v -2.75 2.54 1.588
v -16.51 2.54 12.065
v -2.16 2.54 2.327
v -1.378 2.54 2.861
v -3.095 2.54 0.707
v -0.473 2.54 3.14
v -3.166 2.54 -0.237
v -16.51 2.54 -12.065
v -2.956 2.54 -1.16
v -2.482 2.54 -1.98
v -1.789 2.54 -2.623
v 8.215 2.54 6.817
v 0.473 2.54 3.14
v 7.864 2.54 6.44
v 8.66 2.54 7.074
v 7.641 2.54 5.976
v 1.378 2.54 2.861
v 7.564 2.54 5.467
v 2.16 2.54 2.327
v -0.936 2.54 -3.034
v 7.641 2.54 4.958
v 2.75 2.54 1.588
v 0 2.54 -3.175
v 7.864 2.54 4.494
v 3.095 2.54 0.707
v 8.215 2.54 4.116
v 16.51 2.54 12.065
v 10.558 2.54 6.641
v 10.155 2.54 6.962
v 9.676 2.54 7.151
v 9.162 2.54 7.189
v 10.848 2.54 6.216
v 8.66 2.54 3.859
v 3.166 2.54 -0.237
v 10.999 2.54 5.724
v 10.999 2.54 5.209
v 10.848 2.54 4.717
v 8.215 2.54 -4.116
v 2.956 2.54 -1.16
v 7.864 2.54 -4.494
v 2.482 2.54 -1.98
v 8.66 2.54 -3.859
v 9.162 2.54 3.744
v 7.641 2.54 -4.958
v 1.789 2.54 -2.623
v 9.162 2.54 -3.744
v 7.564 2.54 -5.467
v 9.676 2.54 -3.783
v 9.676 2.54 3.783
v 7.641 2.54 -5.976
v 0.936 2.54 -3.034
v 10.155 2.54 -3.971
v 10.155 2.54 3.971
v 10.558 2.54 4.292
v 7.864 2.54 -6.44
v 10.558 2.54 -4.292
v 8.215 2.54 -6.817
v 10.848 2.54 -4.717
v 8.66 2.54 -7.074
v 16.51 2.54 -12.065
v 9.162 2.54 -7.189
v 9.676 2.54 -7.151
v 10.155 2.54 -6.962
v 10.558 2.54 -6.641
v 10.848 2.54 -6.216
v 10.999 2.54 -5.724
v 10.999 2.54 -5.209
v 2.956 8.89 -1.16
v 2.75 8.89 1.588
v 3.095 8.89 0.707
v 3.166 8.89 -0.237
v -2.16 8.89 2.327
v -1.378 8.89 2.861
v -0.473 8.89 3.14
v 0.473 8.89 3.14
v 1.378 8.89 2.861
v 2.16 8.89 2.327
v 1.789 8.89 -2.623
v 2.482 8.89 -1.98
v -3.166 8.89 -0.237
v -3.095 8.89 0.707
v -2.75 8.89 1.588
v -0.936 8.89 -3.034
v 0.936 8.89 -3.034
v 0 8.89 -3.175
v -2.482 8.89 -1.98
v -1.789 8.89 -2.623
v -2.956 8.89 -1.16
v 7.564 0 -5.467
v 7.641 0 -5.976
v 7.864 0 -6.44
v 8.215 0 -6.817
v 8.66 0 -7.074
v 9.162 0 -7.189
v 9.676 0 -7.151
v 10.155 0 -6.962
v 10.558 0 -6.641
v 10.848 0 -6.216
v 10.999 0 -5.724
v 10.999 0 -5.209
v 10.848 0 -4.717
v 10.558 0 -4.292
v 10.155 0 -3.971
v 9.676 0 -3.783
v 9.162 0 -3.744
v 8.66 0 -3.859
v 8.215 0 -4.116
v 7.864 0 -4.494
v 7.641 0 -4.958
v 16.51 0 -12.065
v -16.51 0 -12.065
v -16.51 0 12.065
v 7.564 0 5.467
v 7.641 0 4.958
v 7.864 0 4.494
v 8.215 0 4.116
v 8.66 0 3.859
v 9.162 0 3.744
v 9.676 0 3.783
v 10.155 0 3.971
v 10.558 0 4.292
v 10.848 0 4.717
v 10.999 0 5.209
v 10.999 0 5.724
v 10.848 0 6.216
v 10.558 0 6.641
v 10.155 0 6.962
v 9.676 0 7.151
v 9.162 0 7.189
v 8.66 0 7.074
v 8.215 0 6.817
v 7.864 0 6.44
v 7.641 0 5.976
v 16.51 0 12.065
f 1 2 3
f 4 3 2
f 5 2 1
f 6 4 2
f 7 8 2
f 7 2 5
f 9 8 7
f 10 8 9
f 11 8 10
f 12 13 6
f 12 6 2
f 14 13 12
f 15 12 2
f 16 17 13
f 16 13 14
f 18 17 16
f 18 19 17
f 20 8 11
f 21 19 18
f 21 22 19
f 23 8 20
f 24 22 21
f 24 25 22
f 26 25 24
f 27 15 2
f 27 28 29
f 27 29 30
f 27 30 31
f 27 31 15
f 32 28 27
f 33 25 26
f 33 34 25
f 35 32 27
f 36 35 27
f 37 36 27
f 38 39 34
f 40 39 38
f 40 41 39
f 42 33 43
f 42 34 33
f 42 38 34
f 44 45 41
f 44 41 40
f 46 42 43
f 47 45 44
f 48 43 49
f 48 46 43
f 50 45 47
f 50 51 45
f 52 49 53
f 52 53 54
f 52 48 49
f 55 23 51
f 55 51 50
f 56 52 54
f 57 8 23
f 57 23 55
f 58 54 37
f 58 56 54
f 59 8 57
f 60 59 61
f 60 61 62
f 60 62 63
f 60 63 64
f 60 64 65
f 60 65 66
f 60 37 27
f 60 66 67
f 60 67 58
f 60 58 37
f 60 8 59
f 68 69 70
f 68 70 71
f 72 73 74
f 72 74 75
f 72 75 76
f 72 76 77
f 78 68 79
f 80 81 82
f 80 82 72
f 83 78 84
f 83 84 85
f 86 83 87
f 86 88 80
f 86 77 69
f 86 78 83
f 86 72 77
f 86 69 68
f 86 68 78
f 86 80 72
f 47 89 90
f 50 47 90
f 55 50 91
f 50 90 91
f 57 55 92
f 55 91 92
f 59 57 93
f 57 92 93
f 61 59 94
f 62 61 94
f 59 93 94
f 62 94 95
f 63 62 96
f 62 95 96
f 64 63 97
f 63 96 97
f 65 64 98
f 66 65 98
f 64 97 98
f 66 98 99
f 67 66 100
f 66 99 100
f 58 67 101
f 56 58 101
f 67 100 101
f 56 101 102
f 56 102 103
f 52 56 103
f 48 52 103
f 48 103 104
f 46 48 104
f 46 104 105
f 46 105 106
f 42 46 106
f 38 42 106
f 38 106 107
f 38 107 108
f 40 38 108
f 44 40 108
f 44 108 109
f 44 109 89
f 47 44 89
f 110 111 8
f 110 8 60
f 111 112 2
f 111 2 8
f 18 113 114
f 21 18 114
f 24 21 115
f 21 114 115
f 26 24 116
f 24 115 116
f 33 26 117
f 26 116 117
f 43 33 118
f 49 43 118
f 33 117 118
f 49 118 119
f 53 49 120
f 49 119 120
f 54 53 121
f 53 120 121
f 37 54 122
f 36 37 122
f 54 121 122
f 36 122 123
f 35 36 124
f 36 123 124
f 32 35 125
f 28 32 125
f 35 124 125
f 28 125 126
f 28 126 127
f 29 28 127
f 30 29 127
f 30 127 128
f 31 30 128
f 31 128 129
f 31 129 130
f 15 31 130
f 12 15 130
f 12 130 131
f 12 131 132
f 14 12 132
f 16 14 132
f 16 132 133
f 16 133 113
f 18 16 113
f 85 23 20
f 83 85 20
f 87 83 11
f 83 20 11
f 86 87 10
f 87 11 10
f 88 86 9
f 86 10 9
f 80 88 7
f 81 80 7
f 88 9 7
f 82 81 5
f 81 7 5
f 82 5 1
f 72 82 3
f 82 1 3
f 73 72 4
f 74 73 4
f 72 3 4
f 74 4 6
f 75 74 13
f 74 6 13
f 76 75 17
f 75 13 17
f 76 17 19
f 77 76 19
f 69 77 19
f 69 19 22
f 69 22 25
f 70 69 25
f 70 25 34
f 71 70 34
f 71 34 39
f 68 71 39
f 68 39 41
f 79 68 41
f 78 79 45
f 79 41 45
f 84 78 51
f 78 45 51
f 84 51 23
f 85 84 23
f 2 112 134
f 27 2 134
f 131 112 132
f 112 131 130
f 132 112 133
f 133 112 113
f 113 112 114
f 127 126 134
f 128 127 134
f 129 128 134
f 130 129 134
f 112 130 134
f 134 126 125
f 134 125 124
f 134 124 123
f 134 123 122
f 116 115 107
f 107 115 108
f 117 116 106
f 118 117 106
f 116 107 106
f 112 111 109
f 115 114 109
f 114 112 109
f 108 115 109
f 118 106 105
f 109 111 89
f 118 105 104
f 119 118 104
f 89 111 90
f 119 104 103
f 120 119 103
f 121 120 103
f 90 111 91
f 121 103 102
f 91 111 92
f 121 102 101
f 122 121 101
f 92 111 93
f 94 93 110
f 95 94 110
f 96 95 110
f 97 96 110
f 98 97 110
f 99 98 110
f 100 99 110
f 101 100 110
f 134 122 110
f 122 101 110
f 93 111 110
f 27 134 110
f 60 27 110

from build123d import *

# Parameters (mm, degrees)
SKETCH1_W             = 33.02
SKETCH1_H             = 24.13
BOSS_EXTRUDE1_DEPTH   = 2.54
SKETCH2_R             = 3.175
BOSS_EXTRUDE2_DEPTH   = 6.35
F_4_CLEARANCE_HOLE1_D = 3.4544


with BuildPart() as part:
    # Sketch1 → Boss-Extrude1 (new body)
    with BuildSketch(Plane(origin=(0, 0, 0), x_dir=(1, 0, 0), z_dir=(0, 1, 0))):
        Rectangle(SKETCH1_W, SKETCH1_H)
    extrude(amount=BOSS_EXTRUDE1_DEPTH)

    # Sketch2 → Boss-Extrude2 (add)
    with BuildSketch(Plane(origin=(0, 2.54, 0), x_dir=(1, 0, 0), z_dir=(0, 1, 0))):
        with Locations(Location((0, 0, 0), (0, 0, 90))):
            Circle(SKETCH2_R)
    extrude(amount=BOSS_EXTRUDE2_DEPTH)

    # #4 Clearance Hole1 (through all)
    with Locations(Plane(origin=(0, 2.54, 0), x_dir=(1, 0, 0), z_dir=(0, 1, 0))):
        with Locations((9.291486619, 5.466660474), (9.291486619, -5.466660474)):
            Hole(F_4_CLEARANCE_HOLE1_D / 2)


solid = part.part
